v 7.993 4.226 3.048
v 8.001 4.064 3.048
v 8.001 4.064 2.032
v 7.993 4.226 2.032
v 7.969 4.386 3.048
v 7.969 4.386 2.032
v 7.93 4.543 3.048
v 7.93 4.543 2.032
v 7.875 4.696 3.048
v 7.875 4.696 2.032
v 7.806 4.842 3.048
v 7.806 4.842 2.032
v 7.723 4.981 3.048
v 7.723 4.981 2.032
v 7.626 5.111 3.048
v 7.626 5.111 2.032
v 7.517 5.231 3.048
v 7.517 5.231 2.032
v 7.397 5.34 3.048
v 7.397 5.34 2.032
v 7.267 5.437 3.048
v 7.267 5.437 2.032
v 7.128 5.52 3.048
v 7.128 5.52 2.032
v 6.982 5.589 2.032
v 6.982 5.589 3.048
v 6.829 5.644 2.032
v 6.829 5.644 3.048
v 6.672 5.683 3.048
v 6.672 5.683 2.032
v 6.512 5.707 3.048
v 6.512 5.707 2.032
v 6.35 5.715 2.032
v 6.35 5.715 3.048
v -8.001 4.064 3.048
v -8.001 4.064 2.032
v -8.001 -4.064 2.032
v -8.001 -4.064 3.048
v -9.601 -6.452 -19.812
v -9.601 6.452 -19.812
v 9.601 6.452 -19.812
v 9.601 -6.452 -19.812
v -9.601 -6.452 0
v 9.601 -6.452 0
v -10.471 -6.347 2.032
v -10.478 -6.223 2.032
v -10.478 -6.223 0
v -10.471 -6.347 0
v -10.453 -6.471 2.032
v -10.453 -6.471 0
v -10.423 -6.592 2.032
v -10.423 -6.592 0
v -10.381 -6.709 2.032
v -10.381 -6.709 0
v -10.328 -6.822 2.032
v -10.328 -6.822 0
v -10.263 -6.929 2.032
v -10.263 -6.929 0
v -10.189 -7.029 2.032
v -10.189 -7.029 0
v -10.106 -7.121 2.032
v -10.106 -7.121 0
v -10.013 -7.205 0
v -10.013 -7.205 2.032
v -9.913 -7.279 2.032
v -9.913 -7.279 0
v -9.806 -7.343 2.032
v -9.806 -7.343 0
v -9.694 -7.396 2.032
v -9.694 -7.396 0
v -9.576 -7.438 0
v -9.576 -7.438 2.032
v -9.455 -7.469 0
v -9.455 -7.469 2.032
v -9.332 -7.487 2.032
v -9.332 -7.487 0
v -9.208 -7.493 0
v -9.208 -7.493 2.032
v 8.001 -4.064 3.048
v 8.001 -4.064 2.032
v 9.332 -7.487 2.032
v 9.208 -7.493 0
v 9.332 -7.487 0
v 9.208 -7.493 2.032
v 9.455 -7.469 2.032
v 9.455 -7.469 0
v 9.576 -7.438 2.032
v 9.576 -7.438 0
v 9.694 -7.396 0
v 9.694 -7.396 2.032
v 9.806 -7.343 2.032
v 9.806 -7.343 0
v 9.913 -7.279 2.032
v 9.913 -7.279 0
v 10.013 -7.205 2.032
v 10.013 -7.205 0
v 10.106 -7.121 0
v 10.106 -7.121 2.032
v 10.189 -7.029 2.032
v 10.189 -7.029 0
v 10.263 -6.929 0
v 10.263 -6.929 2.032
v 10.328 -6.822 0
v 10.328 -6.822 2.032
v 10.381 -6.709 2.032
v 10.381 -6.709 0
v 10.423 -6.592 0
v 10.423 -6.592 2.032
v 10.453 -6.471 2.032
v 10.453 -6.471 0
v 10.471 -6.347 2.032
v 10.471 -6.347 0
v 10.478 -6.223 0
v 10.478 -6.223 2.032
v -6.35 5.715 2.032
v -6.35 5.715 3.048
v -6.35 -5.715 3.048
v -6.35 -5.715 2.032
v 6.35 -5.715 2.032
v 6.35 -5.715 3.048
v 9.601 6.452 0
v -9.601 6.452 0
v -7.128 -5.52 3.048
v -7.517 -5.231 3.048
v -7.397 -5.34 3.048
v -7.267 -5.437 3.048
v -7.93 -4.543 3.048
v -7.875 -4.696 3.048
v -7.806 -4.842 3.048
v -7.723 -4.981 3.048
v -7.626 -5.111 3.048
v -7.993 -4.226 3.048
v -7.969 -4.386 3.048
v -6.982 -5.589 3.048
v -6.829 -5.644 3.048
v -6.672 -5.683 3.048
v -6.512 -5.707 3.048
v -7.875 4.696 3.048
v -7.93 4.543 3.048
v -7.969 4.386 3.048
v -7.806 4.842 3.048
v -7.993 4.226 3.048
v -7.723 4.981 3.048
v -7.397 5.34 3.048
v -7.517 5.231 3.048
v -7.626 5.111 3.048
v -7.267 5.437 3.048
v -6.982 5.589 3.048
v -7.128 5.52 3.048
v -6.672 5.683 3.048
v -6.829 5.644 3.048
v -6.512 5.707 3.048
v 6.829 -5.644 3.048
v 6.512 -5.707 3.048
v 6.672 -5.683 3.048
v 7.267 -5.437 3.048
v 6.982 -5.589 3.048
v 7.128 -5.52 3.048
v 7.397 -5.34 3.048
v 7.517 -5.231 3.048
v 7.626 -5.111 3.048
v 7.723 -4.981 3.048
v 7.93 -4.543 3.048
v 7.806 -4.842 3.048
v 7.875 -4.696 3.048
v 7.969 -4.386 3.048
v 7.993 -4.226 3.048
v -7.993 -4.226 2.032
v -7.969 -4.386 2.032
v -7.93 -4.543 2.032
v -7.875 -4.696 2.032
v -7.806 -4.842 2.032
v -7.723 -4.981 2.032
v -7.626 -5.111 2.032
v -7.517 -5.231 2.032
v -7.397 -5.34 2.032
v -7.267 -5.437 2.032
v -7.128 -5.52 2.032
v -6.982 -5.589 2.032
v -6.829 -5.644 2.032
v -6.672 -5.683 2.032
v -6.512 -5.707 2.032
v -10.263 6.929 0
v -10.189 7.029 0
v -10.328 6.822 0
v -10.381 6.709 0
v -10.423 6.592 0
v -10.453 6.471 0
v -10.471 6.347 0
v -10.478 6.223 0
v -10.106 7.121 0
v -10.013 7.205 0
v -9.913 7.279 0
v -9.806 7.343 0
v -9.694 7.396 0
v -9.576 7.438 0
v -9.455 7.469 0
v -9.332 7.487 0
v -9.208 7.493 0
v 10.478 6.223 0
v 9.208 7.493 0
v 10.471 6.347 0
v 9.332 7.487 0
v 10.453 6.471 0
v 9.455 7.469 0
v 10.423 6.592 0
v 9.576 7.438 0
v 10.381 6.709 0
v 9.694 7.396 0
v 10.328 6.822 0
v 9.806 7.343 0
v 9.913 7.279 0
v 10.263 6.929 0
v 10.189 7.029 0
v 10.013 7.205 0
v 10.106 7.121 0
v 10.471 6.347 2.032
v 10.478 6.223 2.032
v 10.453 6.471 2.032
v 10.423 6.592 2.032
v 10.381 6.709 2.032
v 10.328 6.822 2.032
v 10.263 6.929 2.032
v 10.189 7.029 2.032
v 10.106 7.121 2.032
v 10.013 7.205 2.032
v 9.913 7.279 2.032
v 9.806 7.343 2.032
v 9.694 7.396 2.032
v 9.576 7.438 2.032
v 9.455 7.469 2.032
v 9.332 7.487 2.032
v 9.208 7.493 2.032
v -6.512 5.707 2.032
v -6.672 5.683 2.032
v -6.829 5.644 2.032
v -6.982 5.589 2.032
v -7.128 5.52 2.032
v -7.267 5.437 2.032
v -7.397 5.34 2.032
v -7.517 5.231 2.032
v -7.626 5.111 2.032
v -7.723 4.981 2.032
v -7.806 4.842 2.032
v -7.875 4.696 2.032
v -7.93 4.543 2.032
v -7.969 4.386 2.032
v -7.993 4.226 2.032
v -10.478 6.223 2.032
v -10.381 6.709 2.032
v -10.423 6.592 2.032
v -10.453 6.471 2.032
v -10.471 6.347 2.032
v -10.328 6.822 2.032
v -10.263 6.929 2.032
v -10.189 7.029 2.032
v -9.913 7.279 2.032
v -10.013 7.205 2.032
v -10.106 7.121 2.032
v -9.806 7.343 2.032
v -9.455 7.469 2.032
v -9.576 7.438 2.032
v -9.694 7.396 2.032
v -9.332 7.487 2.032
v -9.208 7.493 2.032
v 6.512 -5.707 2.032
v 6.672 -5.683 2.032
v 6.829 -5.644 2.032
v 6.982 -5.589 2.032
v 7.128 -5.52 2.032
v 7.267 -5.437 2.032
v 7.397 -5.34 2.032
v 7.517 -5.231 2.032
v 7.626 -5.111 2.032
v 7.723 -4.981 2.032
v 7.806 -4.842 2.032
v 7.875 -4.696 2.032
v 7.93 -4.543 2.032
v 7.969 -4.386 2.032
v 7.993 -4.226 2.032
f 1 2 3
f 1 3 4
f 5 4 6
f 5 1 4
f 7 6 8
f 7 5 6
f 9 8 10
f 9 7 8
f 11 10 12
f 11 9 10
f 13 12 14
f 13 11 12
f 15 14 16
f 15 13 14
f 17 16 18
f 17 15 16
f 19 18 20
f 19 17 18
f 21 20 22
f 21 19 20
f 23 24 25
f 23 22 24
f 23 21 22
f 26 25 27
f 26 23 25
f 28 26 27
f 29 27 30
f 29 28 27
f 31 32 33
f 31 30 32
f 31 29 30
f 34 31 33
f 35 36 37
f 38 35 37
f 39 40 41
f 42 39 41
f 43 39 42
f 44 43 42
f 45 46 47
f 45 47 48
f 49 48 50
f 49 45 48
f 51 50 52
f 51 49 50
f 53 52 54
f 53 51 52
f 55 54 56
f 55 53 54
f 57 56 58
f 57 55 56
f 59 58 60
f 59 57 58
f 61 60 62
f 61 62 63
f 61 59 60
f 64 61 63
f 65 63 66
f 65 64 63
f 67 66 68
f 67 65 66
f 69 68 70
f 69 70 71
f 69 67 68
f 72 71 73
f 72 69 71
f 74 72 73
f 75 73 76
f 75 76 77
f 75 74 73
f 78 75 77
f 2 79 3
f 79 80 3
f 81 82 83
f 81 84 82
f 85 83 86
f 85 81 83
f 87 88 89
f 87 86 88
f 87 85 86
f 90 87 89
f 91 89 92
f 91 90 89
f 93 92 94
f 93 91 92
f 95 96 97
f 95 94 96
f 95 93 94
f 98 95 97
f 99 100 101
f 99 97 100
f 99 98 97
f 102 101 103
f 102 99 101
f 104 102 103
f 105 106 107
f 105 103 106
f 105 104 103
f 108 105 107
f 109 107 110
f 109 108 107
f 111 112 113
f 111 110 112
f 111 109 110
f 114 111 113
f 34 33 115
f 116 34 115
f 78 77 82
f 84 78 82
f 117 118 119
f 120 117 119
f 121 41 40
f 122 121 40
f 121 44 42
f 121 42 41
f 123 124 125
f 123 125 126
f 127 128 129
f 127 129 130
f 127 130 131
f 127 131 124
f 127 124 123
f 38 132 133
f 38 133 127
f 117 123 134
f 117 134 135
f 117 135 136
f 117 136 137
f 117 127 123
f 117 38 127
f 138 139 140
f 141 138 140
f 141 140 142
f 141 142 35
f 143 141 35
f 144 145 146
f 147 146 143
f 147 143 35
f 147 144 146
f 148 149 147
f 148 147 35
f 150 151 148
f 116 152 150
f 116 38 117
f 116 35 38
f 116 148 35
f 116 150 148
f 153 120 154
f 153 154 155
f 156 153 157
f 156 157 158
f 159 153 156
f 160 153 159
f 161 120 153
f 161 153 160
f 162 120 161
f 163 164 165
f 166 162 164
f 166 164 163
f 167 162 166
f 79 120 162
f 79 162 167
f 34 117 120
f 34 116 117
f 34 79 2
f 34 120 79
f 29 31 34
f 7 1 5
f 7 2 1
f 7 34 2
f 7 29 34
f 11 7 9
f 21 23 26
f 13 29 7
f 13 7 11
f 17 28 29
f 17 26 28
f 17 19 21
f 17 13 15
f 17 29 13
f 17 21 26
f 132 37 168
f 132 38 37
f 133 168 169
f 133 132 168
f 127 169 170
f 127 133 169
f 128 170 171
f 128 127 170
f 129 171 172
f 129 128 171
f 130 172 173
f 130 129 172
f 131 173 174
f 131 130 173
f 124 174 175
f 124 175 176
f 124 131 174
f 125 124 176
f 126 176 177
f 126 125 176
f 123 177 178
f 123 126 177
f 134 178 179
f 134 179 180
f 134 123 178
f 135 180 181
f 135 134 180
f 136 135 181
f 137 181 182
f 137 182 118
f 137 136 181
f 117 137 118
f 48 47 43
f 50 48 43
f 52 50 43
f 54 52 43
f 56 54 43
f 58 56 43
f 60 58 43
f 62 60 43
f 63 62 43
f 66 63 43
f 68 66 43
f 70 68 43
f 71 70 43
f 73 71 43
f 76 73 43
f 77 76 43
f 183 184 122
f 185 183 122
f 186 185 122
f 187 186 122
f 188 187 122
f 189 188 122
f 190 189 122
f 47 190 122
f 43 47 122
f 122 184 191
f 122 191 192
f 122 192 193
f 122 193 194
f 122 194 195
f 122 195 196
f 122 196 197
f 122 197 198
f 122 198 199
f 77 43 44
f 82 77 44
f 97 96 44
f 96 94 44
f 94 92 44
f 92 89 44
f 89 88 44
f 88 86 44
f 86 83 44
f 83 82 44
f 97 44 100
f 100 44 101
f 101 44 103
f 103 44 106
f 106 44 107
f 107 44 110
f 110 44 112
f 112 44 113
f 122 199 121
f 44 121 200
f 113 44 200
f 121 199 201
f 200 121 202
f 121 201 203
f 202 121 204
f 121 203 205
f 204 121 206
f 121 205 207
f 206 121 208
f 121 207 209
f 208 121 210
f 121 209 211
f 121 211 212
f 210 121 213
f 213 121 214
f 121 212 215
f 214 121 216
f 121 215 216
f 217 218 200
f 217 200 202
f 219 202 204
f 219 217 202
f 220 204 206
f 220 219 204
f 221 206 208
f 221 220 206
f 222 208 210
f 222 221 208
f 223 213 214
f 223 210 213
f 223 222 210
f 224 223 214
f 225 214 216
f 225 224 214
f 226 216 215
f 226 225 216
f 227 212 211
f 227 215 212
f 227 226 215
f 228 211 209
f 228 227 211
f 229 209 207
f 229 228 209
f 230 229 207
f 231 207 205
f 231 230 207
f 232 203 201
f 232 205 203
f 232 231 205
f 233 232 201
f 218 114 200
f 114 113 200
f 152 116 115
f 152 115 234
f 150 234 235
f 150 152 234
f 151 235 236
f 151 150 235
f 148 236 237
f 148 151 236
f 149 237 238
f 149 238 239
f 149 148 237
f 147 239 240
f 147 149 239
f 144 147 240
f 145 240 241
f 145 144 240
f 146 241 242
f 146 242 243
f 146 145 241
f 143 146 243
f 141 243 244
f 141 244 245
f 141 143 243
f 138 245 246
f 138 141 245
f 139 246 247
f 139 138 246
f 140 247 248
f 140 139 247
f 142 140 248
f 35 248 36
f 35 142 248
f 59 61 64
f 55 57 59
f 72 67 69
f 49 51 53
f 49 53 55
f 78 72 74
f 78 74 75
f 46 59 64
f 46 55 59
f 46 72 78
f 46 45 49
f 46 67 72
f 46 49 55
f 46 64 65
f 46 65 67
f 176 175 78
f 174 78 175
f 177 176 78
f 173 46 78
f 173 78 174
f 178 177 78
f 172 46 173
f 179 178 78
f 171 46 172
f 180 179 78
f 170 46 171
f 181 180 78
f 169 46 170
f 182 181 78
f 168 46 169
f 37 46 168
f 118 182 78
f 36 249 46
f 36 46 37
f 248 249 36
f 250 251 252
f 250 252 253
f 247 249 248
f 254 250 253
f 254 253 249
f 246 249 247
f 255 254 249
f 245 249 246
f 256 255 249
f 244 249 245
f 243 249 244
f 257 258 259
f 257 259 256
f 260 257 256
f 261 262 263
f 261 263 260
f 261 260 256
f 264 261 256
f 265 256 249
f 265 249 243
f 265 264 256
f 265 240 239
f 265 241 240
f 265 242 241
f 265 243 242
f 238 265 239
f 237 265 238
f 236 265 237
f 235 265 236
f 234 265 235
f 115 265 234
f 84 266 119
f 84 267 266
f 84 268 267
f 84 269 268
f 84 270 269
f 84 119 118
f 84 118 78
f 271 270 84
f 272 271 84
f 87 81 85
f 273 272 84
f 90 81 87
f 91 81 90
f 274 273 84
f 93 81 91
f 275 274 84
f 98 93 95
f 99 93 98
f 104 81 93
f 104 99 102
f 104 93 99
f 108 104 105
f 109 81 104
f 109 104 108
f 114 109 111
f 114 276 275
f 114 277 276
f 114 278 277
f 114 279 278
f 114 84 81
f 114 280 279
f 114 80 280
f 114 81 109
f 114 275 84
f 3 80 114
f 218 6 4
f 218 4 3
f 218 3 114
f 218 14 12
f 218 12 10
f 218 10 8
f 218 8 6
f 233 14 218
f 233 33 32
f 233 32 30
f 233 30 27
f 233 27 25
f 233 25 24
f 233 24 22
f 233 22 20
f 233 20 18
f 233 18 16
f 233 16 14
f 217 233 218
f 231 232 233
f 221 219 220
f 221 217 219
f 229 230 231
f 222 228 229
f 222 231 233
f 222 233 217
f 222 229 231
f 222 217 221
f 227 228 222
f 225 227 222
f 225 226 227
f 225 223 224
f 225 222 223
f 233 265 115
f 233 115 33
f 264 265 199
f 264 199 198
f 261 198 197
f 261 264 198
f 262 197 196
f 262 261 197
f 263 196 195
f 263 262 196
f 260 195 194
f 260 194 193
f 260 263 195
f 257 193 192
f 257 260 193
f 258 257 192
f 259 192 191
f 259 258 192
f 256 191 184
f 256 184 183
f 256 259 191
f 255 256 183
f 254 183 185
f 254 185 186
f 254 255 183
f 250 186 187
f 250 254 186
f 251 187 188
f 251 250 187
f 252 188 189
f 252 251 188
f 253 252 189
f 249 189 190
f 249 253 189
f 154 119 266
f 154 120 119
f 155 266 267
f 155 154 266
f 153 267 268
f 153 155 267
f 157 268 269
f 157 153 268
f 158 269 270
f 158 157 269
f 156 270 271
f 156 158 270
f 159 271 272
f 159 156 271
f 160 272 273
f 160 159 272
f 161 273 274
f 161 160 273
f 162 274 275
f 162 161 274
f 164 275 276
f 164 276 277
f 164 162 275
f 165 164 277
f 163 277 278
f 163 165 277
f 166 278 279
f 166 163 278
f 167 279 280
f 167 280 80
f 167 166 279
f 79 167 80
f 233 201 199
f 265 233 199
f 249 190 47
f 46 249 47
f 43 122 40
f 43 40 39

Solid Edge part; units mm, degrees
sketch "Sketch1" plane through (0, 0, 0) normal (0, 0, 1) x (1, 0, 0)
  line L0 (10.4775, 7.493) -> (-10.4775, 7.493)
  line L1 (-10.4775, 7.493) -> (-10.4775, -7.493)
  line L2 (-10.4775, -7.493) -> (10.4775, -7.493)
  line L3 (10.4775, -7.493) -> (10.4775, 7.493)
extrude "Protrusion1" add sketch "Sketch1" along normal blind 2.032
sketch "Sketch2" plane through (0, 0, 0) normal (0, 0, 1) x (1, 0, 0)
  line L0 (9.6012, -6.4516) -> (9.6012, 6.4516)
  line L1 (9.6012, 6.4516) -> (-9.6012, 6.4516)
  line L2 (-9.6012, 6.4516) -> (-9.6012, -6.4516)
  line L3 (-9.6012, -6.4516) -> (9.6012, -6.4516)
extrude "ExtrudedProtrusion_2" add sketch "Sketch2" against normal blind 19.812
sketch "Sketch3" plane through (0, 0, 0) normal (0, 0, 1) x (1, 0, 0)
  line L0 (8.001, -5.715) -> (8.001, 5.715)
  line L1 (8.001, 5.715) -> (-8.001, 5.715)
  line L2 (-8.001, 5.715) -> (-8.001, -5.715)
  line L3 (-8.001, -5.715) -> (8.001, -5.715)
extrude "ExtrudedProtrusion_3" add sketch "Sketch3" along normal blind 3.048
fillet "Round_1" radius 1.27 4 edges at (-10.4775, 7.493, 1.016) (-10.4775, -7.493, 1.016) (10.4775, 7.493, 1.016) (10.4775, -7.493, 1.016)
fillet "Round_2" radius 1.651 4 edges at (8.001, -5.715, 2.54) (8.001, 5.715, 2.54) (-8.001, -5.715, 2.54) (-8.001, 5.715, 2.54)
